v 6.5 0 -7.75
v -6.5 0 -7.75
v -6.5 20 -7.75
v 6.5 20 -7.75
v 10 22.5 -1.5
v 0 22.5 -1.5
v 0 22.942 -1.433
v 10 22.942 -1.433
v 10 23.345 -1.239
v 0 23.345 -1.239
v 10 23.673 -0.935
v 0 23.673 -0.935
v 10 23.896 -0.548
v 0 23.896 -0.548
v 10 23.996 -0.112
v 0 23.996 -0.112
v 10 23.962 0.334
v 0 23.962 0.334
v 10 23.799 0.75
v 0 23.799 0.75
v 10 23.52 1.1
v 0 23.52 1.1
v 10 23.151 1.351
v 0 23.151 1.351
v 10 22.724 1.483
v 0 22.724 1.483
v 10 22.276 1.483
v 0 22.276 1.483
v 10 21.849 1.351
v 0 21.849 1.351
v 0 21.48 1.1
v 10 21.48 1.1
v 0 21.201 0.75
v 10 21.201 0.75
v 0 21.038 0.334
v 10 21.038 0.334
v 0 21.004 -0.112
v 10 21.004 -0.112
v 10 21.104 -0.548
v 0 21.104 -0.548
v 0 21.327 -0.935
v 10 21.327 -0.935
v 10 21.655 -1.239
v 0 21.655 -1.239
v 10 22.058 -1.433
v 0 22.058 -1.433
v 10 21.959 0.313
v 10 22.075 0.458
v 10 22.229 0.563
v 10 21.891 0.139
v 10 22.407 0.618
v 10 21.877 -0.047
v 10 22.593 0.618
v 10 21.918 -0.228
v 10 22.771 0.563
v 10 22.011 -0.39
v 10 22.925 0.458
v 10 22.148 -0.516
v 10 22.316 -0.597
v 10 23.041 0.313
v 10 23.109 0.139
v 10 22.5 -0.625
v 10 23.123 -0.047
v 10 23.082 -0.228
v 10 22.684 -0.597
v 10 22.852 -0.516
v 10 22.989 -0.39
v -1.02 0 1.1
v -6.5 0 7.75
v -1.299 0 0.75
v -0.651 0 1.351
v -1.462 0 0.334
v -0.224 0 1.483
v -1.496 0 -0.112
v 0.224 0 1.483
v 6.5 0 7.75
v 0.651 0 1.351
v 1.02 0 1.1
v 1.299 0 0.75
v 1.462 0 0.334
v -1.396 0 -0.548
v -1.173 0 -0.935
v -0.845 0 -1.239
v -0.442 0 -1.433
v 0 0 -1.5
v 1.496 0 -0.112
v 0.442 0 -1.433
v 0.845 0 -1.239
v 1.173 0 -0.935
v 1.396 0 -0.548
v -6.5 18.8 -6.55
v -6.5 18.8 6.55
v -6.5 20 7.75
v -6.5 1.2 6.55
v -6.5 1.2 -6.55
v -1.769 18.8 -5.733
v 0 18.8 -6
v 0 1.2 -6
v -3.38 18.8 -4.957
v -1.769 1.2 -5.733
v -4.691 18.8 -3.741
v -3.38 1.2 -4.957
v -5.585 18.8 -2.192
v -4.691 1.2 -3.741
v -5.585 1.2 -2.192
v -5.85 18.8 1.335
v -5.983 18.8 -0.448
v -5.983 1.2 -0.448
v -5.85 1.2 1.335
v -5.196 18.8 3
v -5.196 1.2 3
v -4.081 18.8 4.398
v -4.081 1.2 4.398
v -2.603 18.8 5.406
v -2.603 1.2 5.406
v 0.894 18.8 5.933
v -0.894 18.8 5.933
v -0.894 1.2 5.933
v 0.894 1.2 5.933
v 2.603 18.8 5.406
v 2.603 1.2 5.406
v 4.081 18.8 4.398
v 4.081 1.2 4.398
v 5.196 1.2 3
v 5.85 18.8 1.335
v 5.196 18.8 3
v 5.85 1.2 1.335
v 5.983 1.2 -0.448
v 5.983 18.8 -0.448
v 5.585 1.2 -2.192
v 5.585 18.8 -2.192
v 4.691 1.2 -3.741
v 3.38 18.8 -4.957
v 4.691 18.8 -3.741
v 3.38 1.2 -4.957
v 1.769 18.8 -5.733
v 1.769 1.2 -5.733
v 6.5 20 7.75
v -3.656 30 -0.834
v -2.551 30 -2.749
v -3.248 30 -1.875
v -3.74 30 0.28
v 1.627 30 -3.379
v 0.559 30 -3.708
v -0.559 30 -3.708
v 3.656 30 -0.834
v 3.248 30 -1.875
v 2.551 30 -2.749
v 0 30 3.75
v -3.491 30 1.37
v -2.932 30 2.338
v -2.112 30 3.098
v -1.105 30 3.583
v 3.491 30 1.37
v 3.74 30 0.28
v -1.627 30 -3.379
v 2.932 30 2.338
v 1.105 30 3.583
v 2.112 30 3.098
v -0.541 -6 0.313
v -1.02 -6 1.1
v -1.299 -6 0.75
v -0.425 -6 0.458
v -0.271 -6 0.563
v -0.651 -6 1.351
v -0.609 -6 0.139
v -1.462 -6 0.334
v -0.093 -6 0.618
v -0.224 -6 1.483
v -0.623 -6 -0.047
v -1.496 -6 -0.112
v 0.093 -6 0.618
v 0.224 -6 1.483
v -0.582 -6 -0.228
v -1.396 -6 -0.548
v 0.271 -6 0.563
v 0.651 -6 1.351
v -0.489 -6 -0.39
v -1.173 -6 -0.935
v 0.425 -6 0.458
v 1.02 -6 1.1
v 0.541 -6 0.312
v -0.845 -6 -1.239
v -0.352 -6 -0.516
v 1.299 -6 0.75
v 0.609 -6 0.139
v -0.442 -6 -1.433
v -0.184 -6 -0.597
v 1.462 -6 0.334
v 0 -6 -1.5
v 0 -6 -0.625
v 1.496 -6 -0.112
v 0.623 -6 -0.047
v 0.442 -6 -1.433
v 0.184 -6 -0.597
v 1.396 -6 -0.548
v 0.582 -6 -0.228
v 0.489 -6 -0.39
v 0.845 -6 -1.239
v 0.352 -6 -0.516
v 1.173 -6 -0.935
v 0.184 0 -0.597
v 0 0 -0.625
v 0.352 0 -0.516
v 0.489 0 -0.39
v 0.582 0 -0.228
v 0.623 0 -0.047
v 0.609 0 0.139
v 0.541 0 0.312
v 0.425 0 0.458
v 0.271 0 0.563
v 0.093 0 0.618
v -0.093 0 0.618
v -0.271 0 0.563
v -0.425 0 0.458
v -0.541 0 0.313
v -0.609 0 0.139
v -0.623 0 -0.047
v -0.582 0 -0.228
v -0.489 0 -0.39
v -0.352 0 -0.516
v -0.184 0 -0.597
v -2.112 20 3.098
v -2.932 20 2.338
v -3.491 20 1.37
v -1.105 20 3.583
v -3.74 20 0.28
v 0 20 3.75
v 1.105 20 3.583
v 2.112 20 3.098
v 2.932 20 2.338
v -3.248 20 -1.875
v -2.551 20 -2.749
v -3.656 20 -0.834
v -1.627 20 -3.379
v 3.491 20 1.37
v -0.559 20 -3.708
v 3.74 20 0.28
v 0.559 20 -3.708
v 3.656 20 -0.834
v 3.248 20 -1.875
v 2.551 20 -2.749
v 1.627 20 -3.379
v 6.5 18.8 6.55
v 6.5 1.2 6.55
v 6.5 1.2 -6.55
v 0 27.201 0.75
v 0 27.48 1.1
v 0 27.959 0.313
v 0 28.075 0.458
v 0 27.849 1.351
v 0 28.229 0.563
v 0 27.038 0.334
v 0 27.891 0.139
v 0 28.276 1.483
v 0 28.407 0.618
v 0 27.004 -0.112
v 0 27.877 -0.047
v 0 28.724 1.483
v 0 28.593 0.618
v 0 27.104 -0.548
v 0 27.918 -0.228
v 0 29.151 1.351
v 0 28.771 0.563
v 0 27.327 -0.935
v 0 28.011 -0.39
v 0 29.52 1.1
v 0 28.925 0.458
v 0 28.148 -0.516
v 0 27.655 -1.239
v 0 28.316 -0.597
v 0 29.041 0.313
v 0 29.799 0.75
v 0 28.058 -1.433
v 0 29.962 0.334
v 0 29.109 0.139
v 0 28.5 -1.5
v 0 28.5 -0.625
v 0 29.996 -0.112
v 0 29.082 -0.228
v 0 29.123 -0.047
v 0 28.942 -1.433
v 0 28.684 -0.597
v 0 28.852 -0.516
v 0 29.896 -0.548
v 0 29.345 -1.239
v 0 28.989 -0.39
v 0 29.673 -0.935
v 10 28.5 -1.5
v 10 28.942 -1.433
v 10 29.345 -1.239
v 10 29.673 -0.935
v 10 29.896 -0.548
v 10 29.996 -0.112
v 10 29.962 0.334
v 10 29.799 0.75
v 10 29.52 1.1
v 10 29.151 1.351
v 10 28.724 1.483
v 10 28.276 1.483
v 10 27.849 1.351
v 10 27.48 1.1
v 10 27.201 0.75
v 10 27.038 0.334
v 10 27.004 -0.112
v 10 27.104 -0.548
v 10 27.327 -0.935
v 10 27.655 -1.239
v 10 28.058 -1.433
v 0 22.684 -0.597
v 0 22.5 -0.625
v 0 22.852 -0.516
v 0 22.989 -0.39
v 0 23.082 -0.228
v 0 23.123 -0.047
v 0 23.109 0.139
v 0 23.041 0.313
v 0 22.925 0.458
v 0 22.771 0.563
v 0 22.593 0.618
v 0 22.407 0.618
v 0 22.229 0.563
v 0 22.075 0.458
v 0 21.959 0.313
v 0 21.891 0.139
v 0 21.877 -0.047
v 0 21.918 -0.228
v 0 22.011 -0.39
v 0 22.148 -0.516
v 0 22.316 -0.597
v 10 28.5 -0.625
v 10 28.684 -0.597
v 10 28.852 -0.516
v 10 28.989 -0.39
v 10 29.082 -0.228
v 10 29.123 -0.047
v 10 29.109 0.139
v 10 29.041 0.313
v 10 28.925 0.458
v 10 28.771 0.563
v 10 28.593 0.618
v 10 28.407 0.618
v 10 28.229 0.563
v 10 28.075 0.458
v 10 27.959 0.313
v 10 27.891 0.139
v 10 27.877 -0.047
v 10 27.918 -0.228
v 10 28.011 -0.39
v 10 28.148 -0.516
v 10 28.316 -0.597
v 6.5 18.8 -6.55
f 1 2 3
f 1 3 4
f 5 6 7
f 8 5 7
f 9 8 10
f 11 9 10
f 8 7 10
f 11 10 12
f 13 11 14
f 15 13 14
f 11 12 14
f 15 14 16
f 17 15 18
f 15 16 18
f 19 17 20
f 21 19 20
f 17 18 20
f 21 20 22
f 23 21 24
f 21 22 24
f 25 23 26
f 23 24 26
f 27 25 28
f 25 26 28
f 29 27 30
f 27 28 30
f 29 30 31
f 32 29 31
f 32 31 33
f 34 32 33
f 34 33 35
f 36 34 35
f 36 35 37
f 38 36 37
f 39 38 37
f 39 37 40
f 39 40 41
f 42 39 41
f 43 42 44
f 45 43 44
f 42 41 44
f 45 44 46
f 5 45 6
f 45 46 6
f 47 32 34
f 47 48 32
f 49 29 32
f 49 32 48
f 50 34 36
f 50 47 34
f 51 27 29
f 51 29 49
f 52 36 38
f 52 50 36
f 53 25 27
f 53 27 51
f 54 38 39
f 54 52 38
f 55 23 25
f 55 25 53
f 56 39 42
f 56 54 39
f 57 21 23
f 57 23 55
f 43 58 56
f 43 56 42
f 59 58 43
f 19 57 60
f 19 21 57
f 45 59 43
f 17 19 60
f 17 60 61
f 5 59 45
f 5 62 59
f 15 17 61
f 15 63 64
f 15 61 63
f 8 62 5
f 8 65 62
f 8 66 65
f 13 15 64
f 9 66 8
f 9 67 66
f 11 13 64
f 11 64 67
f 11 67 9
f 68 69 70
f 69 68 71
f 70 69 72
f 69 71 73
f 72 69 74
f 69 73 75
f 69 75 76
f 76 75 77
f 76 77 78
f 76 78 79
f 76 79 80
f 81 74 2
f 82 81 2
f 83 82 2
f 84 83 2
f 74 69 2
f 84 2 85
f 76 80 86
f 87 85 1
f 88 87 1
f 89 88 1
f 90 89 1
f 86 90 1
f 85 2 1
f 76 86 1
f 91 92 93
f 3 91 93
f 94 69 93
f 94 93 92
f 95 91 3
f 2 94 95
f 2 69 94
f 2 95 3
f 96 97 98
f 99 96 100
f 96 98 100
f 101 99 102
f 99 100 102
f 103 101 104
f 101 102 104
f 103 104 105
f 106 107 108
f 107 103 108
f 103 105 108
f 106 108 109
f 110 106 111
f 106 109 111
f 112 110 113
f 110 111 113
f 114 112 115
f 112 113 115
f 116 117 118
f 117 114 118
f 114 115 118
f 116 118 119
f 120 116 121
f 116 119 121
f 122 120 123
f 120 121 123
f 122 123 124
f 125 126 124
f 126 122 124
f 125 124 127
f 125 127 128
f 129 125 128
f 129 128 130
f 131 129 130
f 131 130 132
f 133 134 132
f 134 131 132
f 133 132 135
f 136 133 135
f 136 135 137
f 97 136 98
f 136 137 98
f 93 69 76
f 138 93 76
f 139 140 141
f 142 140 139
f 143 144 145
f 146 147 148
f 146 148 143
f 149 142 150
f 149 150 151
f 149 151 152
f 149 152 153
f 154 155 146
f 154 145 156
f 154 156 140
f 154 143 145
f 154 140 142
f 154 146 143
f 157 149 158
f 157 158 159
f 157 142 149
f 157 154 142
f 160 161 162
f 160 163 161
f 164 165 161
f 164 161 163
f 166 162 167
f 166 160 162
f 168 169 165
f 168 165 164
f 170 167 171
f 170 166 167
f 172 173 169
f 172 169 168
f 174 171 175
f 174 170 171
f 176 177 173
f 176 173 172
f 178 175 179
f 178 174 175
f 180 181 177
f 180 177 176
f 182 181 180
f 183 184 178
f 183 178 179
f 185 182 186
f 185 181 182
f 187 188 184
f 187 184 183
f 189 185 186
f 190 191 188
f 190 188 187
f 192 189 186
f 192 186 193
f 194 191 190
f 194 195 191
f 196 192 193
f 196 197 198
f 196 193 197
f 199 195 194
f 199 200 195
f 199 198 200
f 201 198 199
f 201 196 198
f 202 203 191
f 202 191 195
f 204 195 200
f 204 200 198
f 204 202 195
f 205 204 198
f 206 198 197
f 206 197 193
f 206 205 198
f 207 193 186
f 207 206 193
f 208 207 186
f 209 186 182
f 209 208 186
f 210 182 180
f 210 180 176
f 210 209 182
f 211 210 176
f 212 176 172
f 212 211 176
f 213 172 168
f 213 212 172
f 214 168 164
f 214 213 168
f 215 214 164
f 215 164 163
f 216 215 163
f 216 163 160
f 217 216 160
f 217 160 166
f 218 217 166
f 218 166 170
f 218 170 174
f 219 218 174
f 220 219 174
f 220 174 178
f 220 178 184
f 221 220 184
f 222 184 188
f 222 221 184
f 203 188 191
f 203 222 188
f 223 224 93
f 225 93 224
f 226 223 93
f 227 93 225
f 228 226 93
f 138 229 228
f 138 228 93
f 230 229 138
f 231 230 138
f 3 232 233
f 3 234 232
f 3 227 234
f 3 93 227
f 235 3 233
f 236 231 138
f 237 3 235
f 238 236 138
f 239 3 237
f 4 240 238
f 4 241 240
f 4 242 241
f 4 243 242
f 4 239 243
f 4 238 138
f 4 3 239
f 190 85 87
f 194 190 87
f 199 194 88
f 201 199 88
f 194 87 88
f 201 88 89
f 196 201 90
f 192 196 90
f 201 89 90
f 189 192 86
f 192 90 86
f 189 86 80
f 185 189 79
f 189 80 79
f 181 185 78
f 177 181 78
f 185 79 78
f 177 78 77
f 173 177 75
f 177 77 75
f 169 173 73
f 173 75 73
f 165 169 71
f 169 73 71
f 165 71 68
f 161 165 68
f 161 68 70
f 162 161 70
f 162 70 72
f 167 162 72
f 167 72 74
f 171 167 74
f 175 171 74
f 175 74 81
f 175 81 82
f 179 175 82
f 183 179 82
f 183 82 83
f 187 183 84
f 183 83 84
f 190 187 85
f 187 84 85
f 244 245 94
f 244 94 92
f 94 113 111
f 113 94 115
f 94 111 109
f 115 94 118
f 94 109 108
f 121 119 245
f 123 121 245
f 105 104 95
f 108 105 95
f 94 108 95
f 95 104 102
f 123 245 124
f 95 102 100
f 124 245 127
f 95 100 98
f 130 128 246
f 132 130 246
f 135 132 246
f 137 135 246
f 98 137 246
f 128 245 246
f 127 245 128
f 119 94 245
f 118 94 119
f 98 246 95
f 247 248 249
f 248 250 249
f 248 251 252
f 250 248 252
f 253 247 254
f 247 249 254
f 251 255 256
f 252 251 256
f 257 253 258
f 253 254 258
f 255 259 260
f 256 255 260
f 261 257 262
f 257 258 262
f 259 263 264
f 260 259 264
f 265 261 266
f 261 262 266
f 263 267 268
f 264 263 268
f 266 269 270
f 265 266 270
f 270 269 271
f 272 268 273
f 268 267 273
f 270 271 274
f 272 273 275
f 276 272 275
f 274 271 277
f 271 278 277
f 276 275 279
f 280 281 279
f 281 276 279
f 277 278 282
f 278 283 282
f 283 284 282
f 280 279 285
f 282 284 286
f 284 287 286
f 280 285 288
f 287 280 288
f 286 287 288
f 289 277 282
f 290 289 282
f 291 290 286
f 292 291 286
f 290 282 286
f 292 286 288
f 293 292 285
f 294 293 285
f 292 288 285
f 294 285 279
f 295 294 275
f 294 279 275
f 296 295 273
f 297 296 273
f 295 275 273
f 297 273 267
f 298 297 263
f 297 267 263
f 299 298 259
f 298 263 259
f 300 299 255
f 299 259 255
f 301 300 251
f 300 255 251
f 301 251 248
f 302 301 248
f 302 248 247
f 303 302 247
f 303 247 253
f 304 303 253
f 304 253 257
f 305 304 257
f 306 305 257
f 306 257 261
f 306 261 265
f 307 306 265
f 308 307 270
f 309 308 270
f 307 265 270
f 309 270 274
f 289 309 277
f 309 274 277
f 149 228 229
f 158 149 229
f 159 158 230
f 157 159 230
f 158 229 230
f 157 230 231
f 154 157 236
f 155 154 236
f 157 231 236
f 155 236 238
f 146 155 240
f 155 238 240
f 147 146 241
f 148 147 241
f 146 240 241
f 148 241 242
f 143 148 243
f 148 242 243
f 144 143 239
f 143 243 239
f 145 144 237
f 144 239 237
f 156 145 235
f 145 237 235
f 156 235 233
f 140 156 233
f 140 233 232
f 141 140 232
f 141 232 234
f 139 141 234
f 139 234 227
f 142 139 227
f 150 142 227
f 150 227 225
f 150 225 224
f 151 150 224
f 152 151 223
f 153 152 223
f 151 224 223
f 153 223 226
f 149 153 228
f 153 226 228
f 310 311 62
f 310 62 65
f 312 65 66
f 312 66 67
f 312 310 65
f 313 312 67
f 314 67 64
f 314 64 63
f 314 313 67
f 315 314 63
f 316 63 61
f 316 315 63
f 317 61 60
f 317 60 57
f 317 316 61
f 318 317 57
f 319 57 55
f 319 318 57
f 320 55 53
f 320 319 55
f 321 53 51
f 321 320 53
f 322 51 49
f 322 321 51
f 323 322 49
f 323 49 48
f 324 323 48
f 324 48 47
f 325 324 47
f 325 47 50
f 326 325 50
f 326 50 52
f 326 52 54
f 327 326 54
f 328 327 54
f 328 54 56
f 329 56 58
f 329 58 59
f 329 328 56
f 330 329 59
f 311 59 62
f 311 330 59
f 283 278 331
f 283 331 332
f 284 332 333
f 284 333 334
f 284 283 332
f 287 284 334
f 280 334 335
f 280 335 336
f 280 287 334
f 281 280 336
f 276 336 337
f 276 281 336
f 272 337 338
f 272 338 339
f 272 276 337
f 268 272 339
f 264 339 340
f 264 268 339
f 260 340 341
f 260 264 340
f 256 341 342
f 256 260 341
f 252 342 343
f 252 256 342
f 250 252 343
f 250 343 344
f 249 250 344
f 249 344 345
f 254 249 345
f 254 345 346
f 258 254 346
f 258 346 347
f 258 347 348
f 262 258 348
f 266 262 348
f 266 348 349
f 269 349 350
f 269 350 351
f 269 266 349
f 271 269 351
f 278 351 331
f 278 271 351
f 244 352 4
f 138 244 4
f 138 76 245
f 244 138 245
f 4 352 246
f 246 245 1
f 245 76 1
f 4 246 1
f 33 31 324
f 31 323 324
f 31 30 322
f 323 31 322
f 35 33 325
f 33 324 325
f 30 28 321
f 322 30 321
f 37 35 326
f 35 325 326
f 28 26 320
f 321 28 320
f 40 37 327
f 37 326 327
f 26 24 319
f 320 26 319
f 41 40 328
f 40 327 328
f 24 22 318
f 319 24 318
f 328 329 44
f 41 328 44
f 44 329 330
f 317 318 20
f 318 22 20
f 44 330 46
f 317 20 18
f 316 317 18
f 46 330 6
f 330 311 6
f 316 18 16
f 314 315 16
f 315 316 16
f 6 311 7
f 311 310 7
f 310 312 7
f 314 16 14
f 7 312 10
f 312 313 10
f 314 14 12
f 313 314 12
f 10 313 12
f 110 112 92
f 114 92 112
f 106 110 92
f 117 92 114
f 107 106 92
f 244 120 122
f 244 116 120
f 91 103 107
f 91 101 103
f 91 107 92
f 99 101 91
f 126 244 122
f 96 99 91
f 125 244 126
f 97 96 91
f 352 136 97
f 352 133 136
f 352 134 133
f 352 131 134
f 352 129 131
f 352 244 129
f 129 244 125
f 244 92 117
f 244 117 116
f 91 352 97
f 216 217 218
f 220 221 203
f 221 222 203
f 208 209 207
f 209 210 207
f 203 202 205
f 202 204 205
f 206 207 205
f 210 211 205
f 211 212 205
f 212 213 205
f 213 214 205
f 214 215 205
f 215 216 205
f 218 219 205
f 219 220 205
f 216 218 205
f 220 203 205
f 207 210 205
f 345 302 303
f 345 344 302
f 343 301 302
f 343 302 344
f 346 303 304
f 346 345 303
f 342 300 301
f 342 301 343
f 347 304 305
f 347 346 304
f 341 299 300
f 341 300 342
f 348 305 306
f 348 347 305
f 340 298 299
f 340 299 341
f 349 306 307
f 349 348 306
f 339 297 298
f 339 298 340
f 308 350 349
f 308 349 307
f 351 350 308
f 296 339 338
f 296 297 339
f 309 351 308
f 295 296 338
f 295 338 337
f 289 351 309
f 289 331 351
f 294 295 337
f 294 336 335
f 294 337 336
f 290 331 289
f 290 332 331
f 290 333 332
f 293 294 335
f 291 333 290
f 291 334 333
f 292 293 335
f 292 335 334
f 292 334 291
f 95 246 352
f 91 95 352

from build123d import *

# Parameters (mm, degrees)
SKETCH_1_W          = 13
SKETCH_1_H          = 15.5
EXTRUDE_291_DEPTH   = 20
SKETCH_2_R          = 1.5
SKETCH_2_R_2        = 0.625
EXTRUDE_3_DEPTH     = 6
SKETCH_3_R          = 3.75
EXTRUDE_583_DEPTH   = 10
SKETCH_4_R          = 1.5
SKETCH_4_R_2        = 0.625
EXTRUDE_746_DEPTH   = 10
EXTRUDE_746_2_DEPTH = 10
SKETCH_6_W          = 13.1
SKETCH_6_H          = 17.6
CUT_EXTRUDE_1_DEPTH = 34.601525263
EXTRUDE_1_REACH     = 33.456
SKETCH_7_R          = 6


with BuildPart() as part:
    # Эскиз1 → Extrude 291 (new body)
    with BuildSketch(Plane(origin=(0, 0, 0), x_dir=(1, 0, 0), z_dir=(0, 1, 0))):
        Rectangle(SKETCH_1_W, SKETCH_1_H)
    extrude(amount=EXTRUDE_291_DEPTH)

    # Эскиз2 → ТрубкаНиз-3мм (add)
    with BuildSketch(Plane.XZ):
        with Locations(Location((0, 0, 0), (0, 0, 270))):
            Circle(SKETCH_2_R)
        with Locations(Location((0, 0, 0), (0, 0, 270))):
            Circle(SKETCH_2_R_2, mode=Mode.SUBTRACT)
    extrude(amount=EXTRUDE_3_DEPTH)

    # Эскиз3 → Extrude 583 (add)
    with BuildSketch(Plane(origin=(0, 20, 0), x_dir=(1, 0, 0), z_dir=(0, 1, 0))):
        with Locations(Location((0, 0, 0), (0, 0, 270))):
            Circle(SKETCH_3_R)
    extrude(amount=EXTRUDE_583_DEPTH)

    # Эскиз6 → Вырез-Вытянуть1 (cut, through all)
    with BuildSketch(Plane(origin=(6.5, 0, 0), x_dir=(0, 0, -1), z_dir=(1, 0, 0))):
        with Locations((0, 10)):
            Rectangle(SKETCH_6_W, SKETCH_6_H)
    extrude(amount=-CUT_EXTRUDE_1_DEPTH, mode=Mode.SUBTRACT)

    # Эскиз7 → Бобышка-Вытянуть1 (add, up to next)
    with BuildSketch(Plane(origin=(0, 1.2, 0), x_dir=(1, 0, 0), z_dir=(0, 1, 0)), mode=Mode.PRIVATE) as extrude_1_sk1:
        with Locations(Location((0, 0, 0), (0, 0, 90))):
            Circle(SKETCH_7_R)
    extrude_1_tool1 = extrude(extrude_1_sk1.sketch, amount=EXTRUDE_1_REACH, mode=Mode.PRIVATE) - part.part
    add(extrude_1_tool1.solids().sort_by_distance((0, 1.2, 0))[0])


with BuildPart() as body_2:
    # Эскиз4 → Extrude 746 (new body)
    with BuildSketch(Plane(origin=(0, 0, 0), x_dir=(0, 0, -1), z_dir=(1, 0, 0))):
        with Locations((0, 28.5)):
            Circle(SKETCH_4_R)
        with Locations((0, 28.5)):
            Circle(SKETCH_4_R_2, mode=Mode.SUBTRACT)
    extrude(amount=EXTRUDE_746_DEPTH)


with BuildPart() as body_3:
    # Эскиз4 → Extrude 746 2 (new body)
    with BuildSketch(Plane(origin=(0, 0, 0), x_dir=(0, 0, -1), z_dir=(1, 0, 0))):
        with Locations((0, 22.5)):
            Circle(SKETCH_4_R)
        with Locations((0, 22.5)):
            Circle(SKETCH_4_R_2, mode=Mode.SUBTRACT)
    extrude(amount=EXTRUDE_746_2_DEPTH)


solid = Compound([part.part, body_2.part, body_3.part])
